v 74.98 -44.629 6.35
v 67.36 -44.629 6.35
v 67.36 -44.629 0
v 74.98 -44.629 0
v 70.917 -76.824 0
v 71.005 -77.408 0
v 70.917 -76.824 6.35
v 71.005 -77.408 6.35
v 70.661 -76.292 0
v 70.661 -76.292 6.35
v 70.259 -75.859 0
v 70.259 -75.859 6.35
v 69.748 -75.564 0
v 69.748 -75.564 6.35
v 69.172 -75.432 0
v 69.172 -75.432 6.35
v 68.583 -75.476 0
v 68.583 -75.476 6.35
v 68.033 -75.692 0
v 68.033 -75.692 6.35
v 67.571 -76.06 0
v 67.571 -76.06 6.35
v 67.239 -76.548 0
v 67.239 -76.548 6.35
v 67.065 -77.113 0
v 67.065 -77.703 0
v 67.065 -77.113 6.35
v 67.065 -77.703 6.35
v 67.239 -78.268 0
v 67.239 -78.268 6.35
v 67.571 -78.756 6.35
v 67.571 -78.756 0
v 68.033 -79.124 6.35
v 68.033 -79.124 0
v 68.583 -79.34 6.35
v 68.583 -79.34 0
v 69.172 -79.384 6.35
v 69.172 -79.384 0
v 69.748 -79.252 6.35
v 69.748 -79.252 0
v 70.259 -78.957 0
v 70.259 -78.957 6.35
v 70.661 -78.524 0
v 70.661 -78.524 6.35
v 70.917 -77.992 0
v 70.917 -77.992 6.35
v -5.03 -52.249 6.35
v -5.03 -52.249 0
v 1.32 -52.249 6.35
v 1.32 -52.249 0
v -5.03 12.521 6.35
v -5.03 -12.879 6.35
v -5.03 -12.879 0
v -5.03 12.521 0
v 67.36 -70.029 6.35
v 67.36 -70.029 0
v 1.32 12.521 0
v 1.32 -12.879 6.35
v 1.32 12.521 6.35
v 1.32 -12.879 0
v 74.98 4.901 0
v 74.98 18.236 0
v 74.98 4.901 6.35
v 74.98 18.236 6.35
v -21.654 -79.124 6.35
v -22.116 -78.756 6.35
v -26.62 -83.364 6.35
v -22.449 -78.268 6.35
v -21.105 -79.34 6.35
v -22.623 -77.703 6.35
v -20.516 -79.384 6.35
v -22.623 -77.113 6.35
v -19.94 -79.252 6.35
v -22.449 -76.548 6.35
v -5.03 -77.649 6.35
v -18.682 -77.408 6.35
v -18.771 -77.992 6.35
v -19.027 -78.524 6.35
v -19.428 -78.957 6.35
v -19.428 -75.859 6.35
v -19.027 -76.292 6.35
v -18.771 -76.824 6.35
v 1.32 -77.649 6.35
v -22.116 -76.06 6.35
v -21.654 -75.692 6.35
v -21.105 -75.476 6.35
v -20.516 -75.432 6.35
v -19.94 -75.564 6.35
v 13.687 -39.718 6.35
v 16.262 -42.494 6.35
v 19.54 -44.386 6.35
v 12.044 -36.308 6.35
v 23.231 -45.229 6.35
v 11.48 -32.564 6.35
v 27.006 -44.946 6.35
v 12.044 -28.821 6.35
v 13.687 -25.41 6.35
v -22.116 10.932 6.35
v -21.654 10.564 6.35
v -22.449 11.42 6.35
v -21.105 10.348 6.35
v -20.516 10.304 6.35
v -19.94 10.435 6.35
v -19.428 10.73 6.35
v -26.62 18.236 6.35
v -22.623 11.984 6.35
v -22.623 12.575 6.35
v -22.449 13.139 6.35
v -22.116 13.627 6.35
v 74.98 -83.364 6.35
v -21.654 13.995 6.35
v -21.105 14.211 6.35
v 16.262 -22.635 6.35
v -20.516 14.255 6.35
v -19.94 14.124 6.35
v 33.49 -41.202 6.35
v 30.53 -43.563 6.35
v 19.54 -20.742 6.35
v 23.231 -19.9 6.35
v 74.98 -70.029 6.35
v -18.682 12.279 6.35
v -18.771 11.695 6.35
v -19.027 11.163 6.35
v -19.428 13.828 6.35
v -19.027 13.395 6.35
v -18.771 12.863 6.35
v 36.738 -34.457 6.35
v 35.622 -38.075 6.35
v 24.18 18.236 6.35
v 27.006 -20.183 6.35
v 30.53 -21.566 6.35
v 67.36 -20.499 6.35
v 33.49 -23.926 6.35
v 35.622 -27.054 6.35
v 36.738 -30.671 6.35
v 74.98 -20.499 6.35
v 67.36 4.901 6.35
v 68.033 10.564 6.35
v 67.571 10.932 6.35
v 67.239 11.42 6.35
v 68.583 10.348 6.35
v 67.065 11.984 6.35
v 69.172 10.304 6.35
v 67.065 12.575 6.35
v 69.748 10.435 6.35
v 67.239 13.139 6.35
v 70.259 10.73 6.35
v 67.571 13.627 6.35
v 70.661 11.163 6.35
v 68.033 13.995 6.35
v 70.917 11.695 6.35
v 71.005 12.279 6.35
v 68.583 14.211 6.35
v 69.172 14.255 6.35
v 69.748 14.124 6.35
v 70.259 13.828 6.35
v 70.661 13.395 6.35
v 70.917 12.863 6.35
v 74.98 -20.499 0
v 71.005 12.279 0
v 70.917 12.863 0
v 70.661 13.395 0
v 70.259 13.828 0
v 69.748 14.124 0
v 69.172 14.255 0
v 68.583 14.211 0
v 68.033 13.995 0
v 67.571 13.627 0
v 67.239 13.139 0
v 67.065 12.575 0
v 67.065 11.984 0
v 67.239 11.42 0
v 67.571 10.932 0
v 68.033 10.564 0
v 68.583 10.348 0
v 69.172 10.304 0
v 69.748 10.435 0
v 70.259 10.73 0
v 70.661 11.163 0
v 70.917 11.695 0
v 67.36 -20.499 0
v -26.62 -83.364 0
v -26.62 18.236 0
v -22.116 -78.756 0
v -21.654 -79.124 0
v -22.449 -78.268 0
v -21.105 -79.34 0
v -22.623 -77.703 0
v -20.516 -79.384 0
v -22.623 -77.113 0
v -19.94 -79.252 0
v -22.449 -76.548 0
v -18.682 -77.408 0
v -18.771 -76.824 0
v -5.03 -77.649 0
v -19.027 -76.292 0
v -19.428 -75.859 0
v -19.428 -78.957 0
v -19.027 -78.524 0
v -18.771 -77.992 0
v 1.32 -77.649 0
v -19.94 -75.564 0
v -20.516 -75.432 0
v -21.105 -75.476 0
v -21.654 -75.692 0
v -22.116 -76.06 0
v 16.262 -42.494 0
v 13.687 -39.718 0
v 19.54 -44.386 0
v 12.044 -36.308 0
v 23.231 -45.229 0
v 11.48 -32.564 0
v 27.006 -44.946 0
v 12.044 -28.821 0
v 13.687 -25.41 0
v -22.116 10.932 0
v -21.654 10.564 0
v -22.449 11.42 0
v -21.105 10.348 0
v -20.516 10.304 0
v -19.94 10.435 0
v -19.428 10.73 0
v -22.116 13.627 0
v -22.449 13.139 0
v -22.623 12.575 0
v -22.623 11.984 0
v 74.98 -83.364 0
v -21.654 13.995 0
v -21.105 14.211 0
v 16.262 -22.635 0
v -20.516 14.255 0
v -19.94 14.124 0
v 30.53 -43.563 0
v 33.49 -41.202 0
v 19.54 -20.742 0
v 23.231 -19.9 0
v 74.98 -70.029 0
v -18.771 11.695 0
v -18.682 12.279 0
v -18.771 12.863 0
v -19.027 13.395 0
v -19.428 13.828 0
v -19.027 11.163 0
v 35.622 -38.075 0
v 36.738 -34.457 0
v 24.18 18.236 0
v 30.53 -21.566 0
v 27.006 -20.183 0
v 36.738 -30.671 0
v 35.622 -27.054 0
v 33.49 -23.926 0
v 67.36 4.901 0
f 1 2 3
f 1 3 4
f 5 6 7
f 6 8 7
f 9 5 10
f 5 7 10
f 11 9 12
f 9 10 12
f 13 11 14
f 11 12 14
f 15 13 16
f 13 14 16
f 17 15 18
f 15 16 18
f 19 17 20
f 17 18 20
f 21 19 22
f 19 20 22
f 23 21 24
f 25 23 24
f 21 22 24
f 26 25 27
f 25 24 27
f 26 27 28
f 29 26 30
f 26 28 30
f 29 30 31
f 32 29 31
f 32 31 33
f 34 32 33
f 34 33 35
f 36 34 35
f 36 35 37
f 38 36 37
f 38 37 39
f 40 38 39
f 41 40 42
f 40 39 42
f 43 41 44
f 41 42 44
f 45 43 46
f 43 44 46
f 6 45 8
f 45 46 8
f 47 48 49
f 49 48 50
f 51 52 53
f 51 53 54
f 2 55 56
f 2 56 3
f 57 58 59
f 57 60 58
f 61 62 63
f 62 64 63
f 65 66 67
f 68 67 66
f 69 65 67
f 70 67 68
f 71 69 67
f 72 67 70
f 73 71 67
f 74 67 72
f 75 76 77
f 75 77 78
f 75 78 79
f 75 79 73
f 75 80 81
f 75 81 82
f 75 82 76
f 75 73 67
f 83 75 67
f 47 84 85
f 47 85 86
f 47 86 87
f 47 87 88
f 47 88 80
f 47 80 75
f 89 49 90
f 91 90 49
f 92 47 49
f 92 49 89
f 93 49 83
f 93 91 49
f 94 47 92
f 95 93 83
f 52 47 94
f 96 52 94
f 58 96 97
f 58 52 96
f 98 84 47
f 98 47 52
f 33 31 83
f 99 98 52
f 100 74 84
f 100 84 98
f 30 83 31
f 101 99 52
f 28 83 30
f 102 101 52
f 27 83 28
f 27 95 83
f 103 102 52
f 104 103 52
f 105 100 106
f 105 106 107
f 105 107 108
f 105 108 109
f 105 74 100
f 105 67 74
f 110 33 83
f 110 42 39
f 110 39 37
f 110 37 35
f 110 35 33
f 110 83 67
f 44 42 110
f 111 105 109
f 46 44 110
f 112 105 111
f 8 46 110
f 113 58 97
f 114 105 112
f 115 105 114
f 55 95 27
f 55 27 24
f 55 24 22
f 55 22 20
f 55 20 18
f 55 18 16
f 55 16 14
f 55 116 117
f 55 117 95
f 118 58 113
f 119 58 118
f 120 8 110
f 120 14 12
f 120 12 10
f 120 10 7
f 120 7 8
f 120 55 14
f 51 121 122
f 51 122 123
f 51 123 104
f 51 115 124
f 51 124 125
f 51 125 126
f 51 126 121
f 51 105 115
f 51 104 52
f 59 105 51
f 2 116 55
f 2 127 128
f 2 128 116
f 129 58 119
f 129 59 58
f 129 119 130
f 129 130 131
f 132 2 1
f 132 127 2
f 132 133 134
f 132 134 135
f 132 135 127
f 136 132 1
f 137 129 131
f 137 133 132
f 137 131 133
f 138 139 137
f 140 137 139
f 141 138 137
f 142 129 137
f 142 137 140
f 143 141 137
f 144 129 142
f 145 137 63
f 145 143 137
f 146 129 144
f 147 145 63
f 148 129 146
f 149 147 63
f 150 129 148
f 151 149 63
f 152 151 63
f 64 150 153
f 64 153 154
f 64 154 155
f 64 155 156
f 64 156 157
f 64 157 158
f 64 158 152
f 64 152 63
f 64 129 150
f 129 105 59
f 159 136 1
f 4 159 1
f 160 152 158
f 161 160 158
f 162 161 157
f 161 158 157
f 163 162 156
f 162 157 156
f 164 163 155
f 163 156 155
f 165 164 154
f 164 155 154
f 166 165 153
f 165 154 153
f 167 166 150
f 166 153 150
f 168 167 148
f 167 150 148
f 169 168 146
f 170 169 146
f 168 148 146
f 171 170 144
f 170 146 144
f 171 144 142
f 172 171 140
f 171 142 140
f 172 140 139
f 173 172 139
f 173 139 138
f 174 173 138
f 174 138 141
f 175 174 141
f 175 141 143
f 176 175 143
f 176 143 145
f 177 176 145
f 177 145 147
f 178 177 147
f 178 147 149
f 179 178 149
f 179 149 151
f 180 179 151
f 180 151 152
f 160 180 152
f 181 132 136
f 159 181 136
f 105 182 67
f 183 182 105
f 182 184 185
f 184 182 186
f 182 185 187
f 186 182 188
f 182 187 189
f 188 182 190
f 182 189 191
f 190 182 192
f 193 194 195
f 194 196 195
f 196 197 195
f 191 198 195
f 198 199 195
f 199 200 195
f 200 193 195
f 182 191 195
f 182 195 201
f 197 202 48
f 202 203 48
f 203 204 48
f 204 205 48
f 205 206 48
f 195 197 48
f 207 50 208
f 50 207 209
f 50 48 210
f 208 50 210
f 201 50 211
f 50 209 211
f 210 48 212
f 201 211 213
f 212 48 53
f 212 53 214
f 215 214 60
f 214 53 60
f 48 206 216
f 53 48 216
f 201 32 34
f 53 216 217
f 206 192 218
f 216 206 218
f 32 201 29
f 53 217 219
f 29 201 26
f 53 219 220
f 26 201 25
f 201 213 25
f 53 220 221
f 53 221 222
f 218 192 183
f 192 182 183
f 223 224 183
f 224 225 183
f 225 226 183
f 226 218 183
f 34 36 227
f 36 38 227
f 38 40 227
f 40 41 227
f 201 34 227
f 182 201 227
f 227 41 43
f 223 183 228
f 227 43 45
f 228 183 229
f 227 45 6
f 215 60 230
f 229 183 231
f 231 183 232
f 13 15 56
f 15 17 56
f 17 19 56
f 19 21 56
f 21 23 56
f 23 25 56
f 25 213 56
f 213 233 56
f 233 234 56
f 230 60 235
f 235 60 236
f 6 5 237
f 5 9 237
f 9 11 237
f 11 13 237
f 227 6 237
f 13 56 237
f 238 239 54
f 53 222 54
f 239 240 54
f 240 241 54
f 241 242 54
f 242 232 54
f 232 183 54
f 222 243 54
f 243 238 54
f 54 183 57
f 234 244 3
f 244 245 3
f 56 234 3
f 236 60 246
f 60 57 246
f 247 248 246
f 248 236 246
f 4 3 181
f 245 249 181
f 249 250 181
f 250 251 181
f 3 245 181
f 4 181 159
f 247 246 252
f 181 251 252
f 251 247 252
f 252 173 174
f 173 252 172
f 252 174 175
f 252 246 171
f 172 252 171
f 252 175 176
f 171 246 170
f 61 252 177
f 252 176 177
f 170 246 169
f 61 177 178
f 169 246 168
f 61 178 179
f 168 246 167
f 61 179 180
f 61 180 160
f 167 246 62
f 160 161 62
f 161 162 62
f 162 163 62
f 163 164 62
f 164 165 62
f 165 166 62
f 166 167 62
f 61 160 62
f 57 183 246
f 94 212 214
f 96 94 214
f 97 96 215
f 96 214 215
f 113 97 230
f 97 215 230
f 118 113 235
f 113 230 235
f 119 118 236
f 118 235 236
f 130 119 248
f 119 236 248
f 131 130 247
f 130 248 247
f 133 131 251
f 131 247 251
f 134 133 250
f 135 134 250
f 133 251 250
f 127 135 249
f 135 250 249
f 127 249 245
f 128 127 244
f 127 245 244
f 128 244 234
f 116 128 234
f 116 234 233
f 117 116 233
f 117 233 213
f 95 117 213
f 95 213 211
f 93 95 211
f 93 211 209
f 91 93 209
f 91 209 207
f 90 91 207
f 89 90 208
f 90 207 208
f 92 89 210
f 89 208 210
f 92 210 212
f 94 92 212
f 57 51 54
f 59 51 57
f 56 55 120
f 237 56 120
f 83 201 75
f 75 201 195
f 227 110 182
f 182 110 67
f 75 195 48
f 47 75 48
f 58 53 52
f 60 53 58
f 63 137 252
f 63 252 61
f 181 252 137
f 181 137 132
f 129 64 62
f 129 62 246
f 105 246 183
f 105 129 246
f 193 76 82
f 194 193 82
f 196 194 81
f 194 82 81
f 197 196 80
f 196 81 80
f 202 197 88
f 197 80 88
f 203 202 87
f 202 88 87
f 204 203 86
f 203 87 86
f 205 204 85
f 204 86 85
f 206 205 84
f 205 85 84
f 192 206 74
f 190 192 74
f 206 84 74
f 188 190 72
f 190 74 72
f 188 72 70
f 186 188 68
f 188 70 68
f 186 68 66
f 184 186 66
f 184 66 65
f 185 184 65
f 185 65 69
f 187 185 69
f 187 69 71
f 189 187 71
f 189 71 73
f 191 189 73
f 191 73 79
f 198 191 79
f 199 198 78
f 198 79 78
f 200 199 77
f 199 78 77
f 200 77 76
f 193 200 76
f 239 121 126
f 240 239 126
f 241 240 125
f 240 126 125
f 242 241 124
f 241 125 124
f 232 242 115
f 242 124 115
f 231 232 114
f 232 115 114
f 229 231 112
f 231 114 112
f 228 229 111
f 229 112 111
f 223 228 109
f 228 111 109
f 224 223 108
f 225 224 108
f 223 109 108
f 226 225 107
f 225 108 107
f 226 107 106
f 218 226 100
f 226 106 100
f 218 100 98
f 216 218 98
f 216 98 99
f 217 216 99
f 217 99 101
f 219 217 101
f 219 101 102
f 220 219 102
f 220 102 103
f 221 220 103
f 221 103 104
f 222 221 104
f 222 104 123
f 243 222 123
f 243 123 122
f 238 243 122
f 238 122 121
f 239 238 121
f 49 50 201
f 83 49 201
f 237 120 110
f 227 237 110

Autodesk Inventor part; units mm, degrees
ref_plane "YZ Plane" through (0, 0, 0) normal (1, 0, 0) x (0, 1, 0)
ref_plane "XZ Plane" through (0, 0, 0) normal (0, 1, 0) x (-1, 0, 0)
ref_plane "XY Plane" through (0, 0, 0) normal (0, 0, 1) x (1, 0, 0)
sketch "Sketch1" plane through (0, 0, 0) normal (0, 0, 1) x (1, 0, 0)
  line L0 (-26.62, 18.8707) -> (74.98, 18.8707)
  line L1 (74.98, 18.8707) -> (74.98, 12.5207)
  line L2 (74.98, -83.9993) -> (-26.62, -83.9993)
  line L3 (-26.62, -83.9993) -> (-26.62, 18.8707)
  line L4 (-26.62, 18.8707) -> (24.18, 18.8707)
  line L5 (24.18, 18.8707) -> (24.18, -33.1993)
  line L6 (24.18, -33.1993) -> (1.32, -33.1993)
  line L7 (24.18, -33.1993) -> (67.36, -33.1993)
  line L8 (1.32, -33.1993) -> (1.32, 12.5207)
  line L9 (1.32, 12.5207) -> (67.36, 12.5207)
  line L10 (67.36, 12.5207) -> (67.36, -33.1993)
  circle A0 centre (24.18, -33.1993) radius 12.7
  line L11 (74.98, 18.8707) -> (82.6, 18.8707)
  line L12 (82.6, 18.8707) -> (82.6, -83.9993)
  line L13 (82.6, -83.9993) -> (74.98, -83.9993)
  line L14 (1.32, -33.1993) -> (1.32, -77.6493)
  line L15 (1.32, 12.5207) -> (-5.03, 12.5207)
  line L16 (-5.03, 12.5207) -> (-5.03, -12.8793)
  line L17 (-5.03, -12.8793) -> (1.32, -12.8793)
  line L18 (1.32, -77.6493) -> (-5.03, -77.6493)
  line L19 (-5.03, -77.6493) -> (-5.03, -52.2493)
  line L20 (-5.03, -52.2493) -> (1.32, -52.2493)
  line L21 (1.32, -77.6493) -> (1.32, -45.2643)
  line L22 (1.32, -45.2643) -> (-5.03, -45.2643)
  line L23 (-5.03, -45.2643) -> (-5.03, -19.8643)
  line L24 (-5.03, -19.8643) -> (1.32, -19.8643)
  line L25 (67.36, -33.1993) -> (67.36, -77.6493)
  line L26 (67.36, -77.6493) -> (73.71, -77.6493)
  line L27 (73.71, -77.6493) -> (73.71, -52.2493)
  line L28 (73.71, -52.2493) -> (67.36, -52.2493)
  line L29 (67.36, -52.2493) -> (67.36, -45.2643)
  line L30 (67.36, -45.2643) -> (73.71, -45.2643)
  line L31 (73.71, -45.2643) -> (73.71, -19.8643)
  line L32 (73.71, -19.8643) -> (67.36, -19.8643)
  line L33 (67.36, 12.5207) -> (73.71, 12.5207)
  line L34 (73.71, 12.5207) -> (73.71, -12.8793)
  line L35 (73.71, -12.8793) -> (67.36, -12.8793)
  point P0 (0, 0)
  dimension "d0" = 101.6
  dimension "d1" = 102.87
  dimension "d2" = 50.8
  dimension "d3" = 52.07
  dimension "d4" = 22.86
  dimension "d5" = 43.18
  dimension "d6" = 45.72
  dimension "d7" = 25.4
  dimension "d8" = 7.62
  dimension "d9" = 44.45
  dimension "d10" = 6.35
  dimension "d11" = 25.4
  dimension "d12" = 6.35
  dimension "d13" = 25.4
  dimension "d14" = 32.385
  dimension "d15" = 25.4
  dimension "d16" = 6.35
  dimension "d17" = 25.4
  dimension "d18" = 6.985
  dimension "d19" = 25.4
extrude "Extrusion1" add sketch "Sketch1" along normal blind 6.35 contours L9 L10 L7 A0 L5 | L5 A0 L6 L8 L9 | L0 L11 L12 L13 L2 L3 | A0 L7 L5 | L5 L6 A0 | L7 A0 L6
sketch "Sketch2" plane through (0, 0, 6.35) normal (0, 0, 1) x (1, 0, 0)
  arc A0 (11.48, -33.1993) -> (36.88, -33.1993) centre (24.18, -33.1993) ccw projected
  line L0 (36.88, -33.1993) -> (11.48, -33.1993) projected
  circle A1 centre (24.18, -33.1993) radius 12.7
  point P0 (0, 0)
  dimension "d22" = 25.4
extrude "Extrusion2" cut sketch "Sketch2" against normal blind 6.35 contours A1 L0
sketch "Sketch3" plane through (0, 0, 6.35) normal (0, 0, 1) x (1, 0, 0)
  line L0 (-26.62, 18.8707) -> (82.6, 18.8707) projected
  line L1 (82.6, -83.9993) -> (-26.62, -83.9993) projected
  line L2 (-26.62, 18.8707) -> (-20.6637, 18.8707)
  line L3 (-20.6637, 18.8707) -> (-20.6637, 12.9144)
  line L4 (-26.62, -83.9993) -> (-20.6637, -83.9993)
  line L5 (-20.6637, -83.9993) -> (-20.6637, -78.043)
  line L6 (-26.62, 18.8707) -> (74.98, 18.8707)
  circle A0 centre (-20.6637, 12.9144) radius 1.9812
  circle A1 centre (-20.6637, -78.043) radius 1.9812
  point P0 (0, 0)
  dimension "d25" = 5.9563
  dimension "d26" = 5.9563
  dimension "d27" = 5.9563
  dimension "d28" = 5.9563
  dimension "d29" = 101.6
  dimension "d30" = 3.9624
  dimension "d31" = 3.9624
extrude "Extrusion3" cut sketch "Sketch3" against normal blind 6.35
sketch "Sketch4" plane through (0, 0, 6.35) normal (0, 0, 1) x (1, 0, 0)
  line L0 (67.36, 12.5207) -> (73.71, 12.5207) projected
  line L1 (73.71, 12.5207) -> (73.71, -12.8793) projected
  line L2 (67.36, -12.8793) -> (67.36, 12.5207) projected
  line L3 (1.32, 12.5207) -> (1.32, -12.8793) projected
  line L4 (-5.03, -12.8793) -> (-5.03, 12.5207) projected
  line L5 (-5.03, 12.5207) -> (1.32, 12.5207) projected
  line L6 (-5.03, 12.5207) -> (-5.03, -0.1793)
  line L7 (-5.03, -0.1793) -> (1.32, -0.1793)
  line L8 (67.36, 12.5207) -> (67.36, -0.1793)
  line L9 (67.36, -0.1793) -> (73.71, -0.1793)
  point P0 (0, 0)
  dimension "d34" = 12.7
  dimension "d35" = 12.7
extrude "Extrusion4" add sketch "Sketch4" against normal blind 6.35
sketch "Sketch5" plane through (0, 0, 6.35) normal (0, 0, 1) x (1, 0, 0)
  circle A0 centre (-20.6637, 12.9144) radius 1.9812 projected
  line L0 (-26.62, 18.8707) -> (82.6, 18.8707) projected
  line L1 (82.6, -83.9993) -> (-26.62, -83.9993) projected
  line L2 (73.71, -52.2493) -> (73.71, -77.6493) projected
  line L3 (67.36, -77.6493) -> (67.36, -52.2493) projected
  line L4 (67.36, -0.1793) -> (73.71, -0.1793) projected
  line L5 (-5.03, -0.1793) -> (1.32, -0.1793) projected
  line L6 (-26.62, 18.8707) -> (74.98, 18.8707)
  line L7 (74.98, 18.8707) -> (74.98, 12.9144)
  line L8 (-26.62, -83.9993) -> (74.98, -83.9993)
  line L9 (-5.03, -0.1793) -> (-5.03, 12.5207)
  line L10 (-5.03, 12.5207) -> (1.32, 12.5207)
  line L11 (1.32, 12.5207) -> (1.32, -0.1793)
  line L12 (67.36, -77.6493) -> (67.36, -70.0293)
  line L13 (67.36, -70.0293) -> (73.71, -70.0293)
  line L14 (67.36, -0.1793) -> (67.36, 4.9007)
  line L15 (67.36, 4.9007) -> (73.71, 4.9007)
  line L16 (73.71, 4.9007) -> (73.71, -0.1793)
  point P0 (0, 0)
  dimension "d38" = 101.6
  dimension "d39" = 5.9563
  dimension "d40" = 5.9563
  dimension "d41" = 101.6
  dimension "d42" = 12.7
  dimension "d43" = 7.62
  dimension "d44" = 5.08
extrude "Extrusion5" cut sketch "Sketch5" against normal blind 6.35 contours L14 L15 L16 L4 | L9 L10 L11 L5
sketch "Sketch6" plane through (0, 0, 6.35) normal (0, 0, 1) x (1, 0, 0)
  line L0 (73.71, -52.2493) -> (73.71, -77.6493) projected
  line L1 (73.71, -77.6493) -> (67.36, -77.6493) projected
  line L2 (67.36, -77.6493) -> (67.36, -52.2493) projected
  line L3 (67.36, -77.6493) -> (67.36, -70.0293)
  line L4 (67.36, -70.0293) -> (73.71, -70.0293)
  point P0 (0, 0)
  dimension "d47" = 7.62
extrude "Extrusion6" add sketch "Sketch6" against normal blind 6.35
sketch "Sketch7" plane through (0, 0, 6.35) normal (0, 0, 1) x (1, 0, 0)
  line L0 (-26.62, 18.8707) -> (82.6, 18.8707) projected
  line L1 (82.6, -83.9993) -> (-26.62, -83.9993) projected
  line L2 (-26.62, 18.8707) -> (74.98, 18.8707)
  line L3 (74.98, 18.8707) -> (74.98, 12.9144)
  line L4 (-26.62, -83.9993) -> (74.98, -83.9993)
  line L5 (74.98, -83.9993) -> (74.98, -78.043)
  line L6 (74.98, -78.043) -> (69.0237, -78.043)
  line L7 (74.98, 12.9144) -> (69.0237, 12.9144)
  circle A0 centre (69.0237, 12.9144) radius 1.9812
  circle A1 centre (69.0237, -78.043) radius 1.9812
  point P0 (0, 0)
  dimension "d50" = 101.6
  dimension "d51" = 5.9563
  dimension "d52" = 101.6
  dimension "d53" = 5.9563
  dimension "d54" = 5.9563
  dimension "d55" = 5.9563
  dimension "d56" = 3.9624
  dimension "d57" = 3.9624
extrude "Extrusion7" cut sketch "Sketch7" against normal blind 6.35
sketch "Sketch8" plane through (0, 0, 6.35) normal (0, 0, 1) x (1, 0, 0)
  line L0 (73.71, 4.9007) -> (73.71, -12.8793) projected
  line L1 (-26.62, 18.8707) -> (82.6, 18.8707) projected
  line L2 (82.6, -83.9993) -> (-26.62, -83.9993) projected
  line L3 (82.6, 18.8707) -> (82.6, -83.9993) projected
  line L4 (73.71, -52.2493) -> (73.71, -70.0293) projected
  line L5 (73.71, -19.8643) -> (73.71, -45.2643) projected
  line L6 (-26.62, 18.8707) -> (74.98, 18.8707)
  line L7 (74.98, 18.8707) -> (74.98, -83.9993)
  line L8 (73.71, -52.2493) -> (74.98, -52.2493)
  line L9 (73.71, -70.0293) -> (74.98, -70.0293)
  line L10 (73.71, -45.2643) -> (74.98, -45.2643)
  line L11 (73.71, -19.8643) -> (74.98, -19.8643)
  line L12 (73.71, 4.9007) -> (74.98, 4.9007)
  line L13 (73.71, -12.8793) -> (74.98, -12.8793)
  point P0 (0, 0)
  dimension "d60" = 101.6
extrude "Extrusion8" cut sketch "Sketch8" against normal blind 6.35
sketch "Sketch9" plane through (0, 0, 6.35) normal (0, 0, 1) x (1, 0, 0)
  line L0 (74.98, -45.2643) -> (67.36, -45.2643) projected
  line L1 (67.36, -45.2643) -> (67.36, -19.8643) projected
  line L2 (67.36, -19.8643) -> (74.98, -19.8643) projected
  line L3 (-5.03, 12.5207) -> (1.32, 12.5207) projected
  line L4 (74.98, -19.8643) -> (74.98, -45.2643)
  point P0 (0, 0)
extrude "Extrusion9" add sketch "Sketch9" against normal blind 6.35
sketch "Sketch11" plane through (0, 0, 6.35) normal (0, 0, 1) x (1, 0, 0)
  line L0 (67.36, 4.9007) -> (74.98, 4.9007) projected
  line L1 (74.98, -83.9993) -> (74.98, -70.0293) projected
  line L2 (67.36, -70.0293) -> (67.36, -52.2493) projected
  line L3 (74.98, -52.2493) -> (74.98, -12.8793) projected
  line L4 (67.36, -12.8793) -> (67.36, 4.9007) projected
  line L5 (-5.03, 12.5207) -> (1.32, 12.5207) projected
  line L6 (67.36, 4.9007) -> (67.36, -20.4993)
  line L7 (67.36, -20.4993) -> (74.98, -20.4993)
  line L8 (74.98, 4.9007) -> (74.98, -20.4993)
  line L9 (74.98, 4.9007) -> (67.36, 4.9007)
  line L10 (67.36, -70.0293) -> (67.36, -44.6293)
  line L11 (67.36, -44.6293) -> (74.98, -44.6293)
  line L12 (74.98, -44.6293) -> (74.98, -70.0293)
  line L13 (67.36, -70.0293) -> (74.98, -70.0293)
  point P0 (0, 0)
  dimension "d67" = 25.4
  dimension "d68" = 25.4
  dimension "d69" = 7.62
extrude "Extrusion10" cut sketch "Sketch11" against normal blind 6.35
sketch "Sketch12" plane through (0, 0, 6.35) normal (0, 0, 1) x (1, 0, 0)
  line L0 (1.32, -19.8643) -> (1.32, -45.2643) projected
  line L1 (1.32, -45.2643) -> (-5.03, -45.2643) projected
  line L2 (-5.03, -45.2643) -> (-5.03, -19.8643) projected
  line L3 (-5.03, -19.8643) -> (1.32, -19.8643) projected
  point P0 (0, 0)
extrude "Extrusion11" add sketch "Sketch12" against normal blind 6.35
sketch "Sketch13" plane through (0, 0, 6.35) normal (0, 0, 1) x (1, 0, 0)
  circle A0 centre (24.18, -33.1993) radius 12.7 projected
  point P0 (0, 0)
extrude "Extrusion12" add sketch "Sketch13" against normal blind 6.35
sketch "Sketch14" plane through (0, 0, 6.35) normal (0, 0, 1) x (1, 0, 0)
  circle A0 centre (69.0237, -78.043) radius 1.9812 projected
  circle A1 centre (69.0237, 12.9144) radius 1.9812 projected
  circle A2 centre (-20.6637, -78.043) radius 1.9812 projected
  circle A3 centre (-20.6637, 12.9144) radius 1.9812 projected
  point P0 (0, 0)
extrude "Extrusion13" add sketch "Sketch14" against normal blind 6.35
sketch "Sketch15" plane through (0, 0, 6.35) normal (0, 0, 1) x (1, 0, 0)
  line L0 (74.98, 4.9007) -> (74.98, 18.8707) projected
  line L1 (74.98, -83.9993) -> (74.98, -70.0293) projected
  line L2 (-26.62, 18.8707) -> (74.98, 18.8707)
  line L3 (74.98, 18.8707) -> (74.98, 18.2357)
  line L4 (74.98, 18.2357) -> (-26.62, 18.2357)
  line L5 (-26.62, 18.2357) -> (-26.62, 18.8707)
  line L6 (-26.62, -83.9993) -> (74.98, -83.9993)
  line L7 (74.98, -83.9993) -> (74.98, -83.3643)
  line L8 (74.98, -83.3643) -> (-26.62, -83.3643)
  line L9 (-26.62, -83.3643) -> (-26.62, -83.9993)
  point P0 (0, 0)
  dimension "d78" = 0.635
  dimension "d79" = 0.635
extrude "Extrusion14" cut sketch "Sketch15" against normal blind 6.35
sketch "Sketch16" plane through (0, 0, 6.35) normal (0, 0, 1) x (1, 0, 0)
  line L0 (-26.62, -83.3643) -> (-26.62, 18.2357) projected
  line L1 (-26.62, 18.2357) -> (74.98, -83.3643)
  line L2 (-26.62, -83.3643) -> (74.98, 18.2357)
  line L3 (-26.62, 18.2357) -> (-26.62, -32.5643)
  line L4 (-26.62, -32.5643) -> (-26.62, 12.2794)
  line L5 (-26.62, 12.2794) -> (69.0237, 12.2794)
  line L6 (69.0237, 12.2794) -> (69.0237, -77.408)
  line L7 (69.0237, -77.408) -> (-20.6637, -77.408)
  circle A0 centre (-20.6637, 12.2794) radius 1.9812
  circle A1 centre (69.0237, 12.2794) radius 1.9812
  circle A2 centre (69.0237, -77.408) radius 1.9812
  circle A3 centre (-20.6637, -77.408) radius 1.9812
  point P0 (0, 0)
  dimension "d82" = 50.8
  dimension "d83" = 44.8437
  dimension "d84" = 3.9624
  dimension "d85" = 3.9624
  dimension "d86" = 3.9624
  dimension "d87" = 3.9624
extrude "Extrusion15" cut sketch "Sketch16" against normal blind 6.35 contours A3 L2 | L2 L7 A3 | L2 A3 L7 | A0 L1 L5 | L5 L1 A0 | A2 L1 L7 | L7 L1 A2 | A0 L5 L1 | L5 A0 L1 | A2 L6 L1 | A1 L5 L2 | L2 L6 A1 | L6 A2 L1 | L5 A1 L2 | L2 A1 L6
sketch "Sketch17" plane through (0, 0, 0) normal (0, 0, -1) x (-1, 0, 0)
  line L0 (26.62, -83.3643) -> (-74.98, 18.2357)
  line L1 (26.62, 18.2357) -> (-74.98, -83.3643)
  circle A0 centre (-24.18, -32.5643) radius 12.7
  point P0 (0, 0)
  dimension "d90" = 25.4
extrude "Extrusion16" cut sketch "Sketch17" against normal blind 25.4
properties part number "wheel top"
